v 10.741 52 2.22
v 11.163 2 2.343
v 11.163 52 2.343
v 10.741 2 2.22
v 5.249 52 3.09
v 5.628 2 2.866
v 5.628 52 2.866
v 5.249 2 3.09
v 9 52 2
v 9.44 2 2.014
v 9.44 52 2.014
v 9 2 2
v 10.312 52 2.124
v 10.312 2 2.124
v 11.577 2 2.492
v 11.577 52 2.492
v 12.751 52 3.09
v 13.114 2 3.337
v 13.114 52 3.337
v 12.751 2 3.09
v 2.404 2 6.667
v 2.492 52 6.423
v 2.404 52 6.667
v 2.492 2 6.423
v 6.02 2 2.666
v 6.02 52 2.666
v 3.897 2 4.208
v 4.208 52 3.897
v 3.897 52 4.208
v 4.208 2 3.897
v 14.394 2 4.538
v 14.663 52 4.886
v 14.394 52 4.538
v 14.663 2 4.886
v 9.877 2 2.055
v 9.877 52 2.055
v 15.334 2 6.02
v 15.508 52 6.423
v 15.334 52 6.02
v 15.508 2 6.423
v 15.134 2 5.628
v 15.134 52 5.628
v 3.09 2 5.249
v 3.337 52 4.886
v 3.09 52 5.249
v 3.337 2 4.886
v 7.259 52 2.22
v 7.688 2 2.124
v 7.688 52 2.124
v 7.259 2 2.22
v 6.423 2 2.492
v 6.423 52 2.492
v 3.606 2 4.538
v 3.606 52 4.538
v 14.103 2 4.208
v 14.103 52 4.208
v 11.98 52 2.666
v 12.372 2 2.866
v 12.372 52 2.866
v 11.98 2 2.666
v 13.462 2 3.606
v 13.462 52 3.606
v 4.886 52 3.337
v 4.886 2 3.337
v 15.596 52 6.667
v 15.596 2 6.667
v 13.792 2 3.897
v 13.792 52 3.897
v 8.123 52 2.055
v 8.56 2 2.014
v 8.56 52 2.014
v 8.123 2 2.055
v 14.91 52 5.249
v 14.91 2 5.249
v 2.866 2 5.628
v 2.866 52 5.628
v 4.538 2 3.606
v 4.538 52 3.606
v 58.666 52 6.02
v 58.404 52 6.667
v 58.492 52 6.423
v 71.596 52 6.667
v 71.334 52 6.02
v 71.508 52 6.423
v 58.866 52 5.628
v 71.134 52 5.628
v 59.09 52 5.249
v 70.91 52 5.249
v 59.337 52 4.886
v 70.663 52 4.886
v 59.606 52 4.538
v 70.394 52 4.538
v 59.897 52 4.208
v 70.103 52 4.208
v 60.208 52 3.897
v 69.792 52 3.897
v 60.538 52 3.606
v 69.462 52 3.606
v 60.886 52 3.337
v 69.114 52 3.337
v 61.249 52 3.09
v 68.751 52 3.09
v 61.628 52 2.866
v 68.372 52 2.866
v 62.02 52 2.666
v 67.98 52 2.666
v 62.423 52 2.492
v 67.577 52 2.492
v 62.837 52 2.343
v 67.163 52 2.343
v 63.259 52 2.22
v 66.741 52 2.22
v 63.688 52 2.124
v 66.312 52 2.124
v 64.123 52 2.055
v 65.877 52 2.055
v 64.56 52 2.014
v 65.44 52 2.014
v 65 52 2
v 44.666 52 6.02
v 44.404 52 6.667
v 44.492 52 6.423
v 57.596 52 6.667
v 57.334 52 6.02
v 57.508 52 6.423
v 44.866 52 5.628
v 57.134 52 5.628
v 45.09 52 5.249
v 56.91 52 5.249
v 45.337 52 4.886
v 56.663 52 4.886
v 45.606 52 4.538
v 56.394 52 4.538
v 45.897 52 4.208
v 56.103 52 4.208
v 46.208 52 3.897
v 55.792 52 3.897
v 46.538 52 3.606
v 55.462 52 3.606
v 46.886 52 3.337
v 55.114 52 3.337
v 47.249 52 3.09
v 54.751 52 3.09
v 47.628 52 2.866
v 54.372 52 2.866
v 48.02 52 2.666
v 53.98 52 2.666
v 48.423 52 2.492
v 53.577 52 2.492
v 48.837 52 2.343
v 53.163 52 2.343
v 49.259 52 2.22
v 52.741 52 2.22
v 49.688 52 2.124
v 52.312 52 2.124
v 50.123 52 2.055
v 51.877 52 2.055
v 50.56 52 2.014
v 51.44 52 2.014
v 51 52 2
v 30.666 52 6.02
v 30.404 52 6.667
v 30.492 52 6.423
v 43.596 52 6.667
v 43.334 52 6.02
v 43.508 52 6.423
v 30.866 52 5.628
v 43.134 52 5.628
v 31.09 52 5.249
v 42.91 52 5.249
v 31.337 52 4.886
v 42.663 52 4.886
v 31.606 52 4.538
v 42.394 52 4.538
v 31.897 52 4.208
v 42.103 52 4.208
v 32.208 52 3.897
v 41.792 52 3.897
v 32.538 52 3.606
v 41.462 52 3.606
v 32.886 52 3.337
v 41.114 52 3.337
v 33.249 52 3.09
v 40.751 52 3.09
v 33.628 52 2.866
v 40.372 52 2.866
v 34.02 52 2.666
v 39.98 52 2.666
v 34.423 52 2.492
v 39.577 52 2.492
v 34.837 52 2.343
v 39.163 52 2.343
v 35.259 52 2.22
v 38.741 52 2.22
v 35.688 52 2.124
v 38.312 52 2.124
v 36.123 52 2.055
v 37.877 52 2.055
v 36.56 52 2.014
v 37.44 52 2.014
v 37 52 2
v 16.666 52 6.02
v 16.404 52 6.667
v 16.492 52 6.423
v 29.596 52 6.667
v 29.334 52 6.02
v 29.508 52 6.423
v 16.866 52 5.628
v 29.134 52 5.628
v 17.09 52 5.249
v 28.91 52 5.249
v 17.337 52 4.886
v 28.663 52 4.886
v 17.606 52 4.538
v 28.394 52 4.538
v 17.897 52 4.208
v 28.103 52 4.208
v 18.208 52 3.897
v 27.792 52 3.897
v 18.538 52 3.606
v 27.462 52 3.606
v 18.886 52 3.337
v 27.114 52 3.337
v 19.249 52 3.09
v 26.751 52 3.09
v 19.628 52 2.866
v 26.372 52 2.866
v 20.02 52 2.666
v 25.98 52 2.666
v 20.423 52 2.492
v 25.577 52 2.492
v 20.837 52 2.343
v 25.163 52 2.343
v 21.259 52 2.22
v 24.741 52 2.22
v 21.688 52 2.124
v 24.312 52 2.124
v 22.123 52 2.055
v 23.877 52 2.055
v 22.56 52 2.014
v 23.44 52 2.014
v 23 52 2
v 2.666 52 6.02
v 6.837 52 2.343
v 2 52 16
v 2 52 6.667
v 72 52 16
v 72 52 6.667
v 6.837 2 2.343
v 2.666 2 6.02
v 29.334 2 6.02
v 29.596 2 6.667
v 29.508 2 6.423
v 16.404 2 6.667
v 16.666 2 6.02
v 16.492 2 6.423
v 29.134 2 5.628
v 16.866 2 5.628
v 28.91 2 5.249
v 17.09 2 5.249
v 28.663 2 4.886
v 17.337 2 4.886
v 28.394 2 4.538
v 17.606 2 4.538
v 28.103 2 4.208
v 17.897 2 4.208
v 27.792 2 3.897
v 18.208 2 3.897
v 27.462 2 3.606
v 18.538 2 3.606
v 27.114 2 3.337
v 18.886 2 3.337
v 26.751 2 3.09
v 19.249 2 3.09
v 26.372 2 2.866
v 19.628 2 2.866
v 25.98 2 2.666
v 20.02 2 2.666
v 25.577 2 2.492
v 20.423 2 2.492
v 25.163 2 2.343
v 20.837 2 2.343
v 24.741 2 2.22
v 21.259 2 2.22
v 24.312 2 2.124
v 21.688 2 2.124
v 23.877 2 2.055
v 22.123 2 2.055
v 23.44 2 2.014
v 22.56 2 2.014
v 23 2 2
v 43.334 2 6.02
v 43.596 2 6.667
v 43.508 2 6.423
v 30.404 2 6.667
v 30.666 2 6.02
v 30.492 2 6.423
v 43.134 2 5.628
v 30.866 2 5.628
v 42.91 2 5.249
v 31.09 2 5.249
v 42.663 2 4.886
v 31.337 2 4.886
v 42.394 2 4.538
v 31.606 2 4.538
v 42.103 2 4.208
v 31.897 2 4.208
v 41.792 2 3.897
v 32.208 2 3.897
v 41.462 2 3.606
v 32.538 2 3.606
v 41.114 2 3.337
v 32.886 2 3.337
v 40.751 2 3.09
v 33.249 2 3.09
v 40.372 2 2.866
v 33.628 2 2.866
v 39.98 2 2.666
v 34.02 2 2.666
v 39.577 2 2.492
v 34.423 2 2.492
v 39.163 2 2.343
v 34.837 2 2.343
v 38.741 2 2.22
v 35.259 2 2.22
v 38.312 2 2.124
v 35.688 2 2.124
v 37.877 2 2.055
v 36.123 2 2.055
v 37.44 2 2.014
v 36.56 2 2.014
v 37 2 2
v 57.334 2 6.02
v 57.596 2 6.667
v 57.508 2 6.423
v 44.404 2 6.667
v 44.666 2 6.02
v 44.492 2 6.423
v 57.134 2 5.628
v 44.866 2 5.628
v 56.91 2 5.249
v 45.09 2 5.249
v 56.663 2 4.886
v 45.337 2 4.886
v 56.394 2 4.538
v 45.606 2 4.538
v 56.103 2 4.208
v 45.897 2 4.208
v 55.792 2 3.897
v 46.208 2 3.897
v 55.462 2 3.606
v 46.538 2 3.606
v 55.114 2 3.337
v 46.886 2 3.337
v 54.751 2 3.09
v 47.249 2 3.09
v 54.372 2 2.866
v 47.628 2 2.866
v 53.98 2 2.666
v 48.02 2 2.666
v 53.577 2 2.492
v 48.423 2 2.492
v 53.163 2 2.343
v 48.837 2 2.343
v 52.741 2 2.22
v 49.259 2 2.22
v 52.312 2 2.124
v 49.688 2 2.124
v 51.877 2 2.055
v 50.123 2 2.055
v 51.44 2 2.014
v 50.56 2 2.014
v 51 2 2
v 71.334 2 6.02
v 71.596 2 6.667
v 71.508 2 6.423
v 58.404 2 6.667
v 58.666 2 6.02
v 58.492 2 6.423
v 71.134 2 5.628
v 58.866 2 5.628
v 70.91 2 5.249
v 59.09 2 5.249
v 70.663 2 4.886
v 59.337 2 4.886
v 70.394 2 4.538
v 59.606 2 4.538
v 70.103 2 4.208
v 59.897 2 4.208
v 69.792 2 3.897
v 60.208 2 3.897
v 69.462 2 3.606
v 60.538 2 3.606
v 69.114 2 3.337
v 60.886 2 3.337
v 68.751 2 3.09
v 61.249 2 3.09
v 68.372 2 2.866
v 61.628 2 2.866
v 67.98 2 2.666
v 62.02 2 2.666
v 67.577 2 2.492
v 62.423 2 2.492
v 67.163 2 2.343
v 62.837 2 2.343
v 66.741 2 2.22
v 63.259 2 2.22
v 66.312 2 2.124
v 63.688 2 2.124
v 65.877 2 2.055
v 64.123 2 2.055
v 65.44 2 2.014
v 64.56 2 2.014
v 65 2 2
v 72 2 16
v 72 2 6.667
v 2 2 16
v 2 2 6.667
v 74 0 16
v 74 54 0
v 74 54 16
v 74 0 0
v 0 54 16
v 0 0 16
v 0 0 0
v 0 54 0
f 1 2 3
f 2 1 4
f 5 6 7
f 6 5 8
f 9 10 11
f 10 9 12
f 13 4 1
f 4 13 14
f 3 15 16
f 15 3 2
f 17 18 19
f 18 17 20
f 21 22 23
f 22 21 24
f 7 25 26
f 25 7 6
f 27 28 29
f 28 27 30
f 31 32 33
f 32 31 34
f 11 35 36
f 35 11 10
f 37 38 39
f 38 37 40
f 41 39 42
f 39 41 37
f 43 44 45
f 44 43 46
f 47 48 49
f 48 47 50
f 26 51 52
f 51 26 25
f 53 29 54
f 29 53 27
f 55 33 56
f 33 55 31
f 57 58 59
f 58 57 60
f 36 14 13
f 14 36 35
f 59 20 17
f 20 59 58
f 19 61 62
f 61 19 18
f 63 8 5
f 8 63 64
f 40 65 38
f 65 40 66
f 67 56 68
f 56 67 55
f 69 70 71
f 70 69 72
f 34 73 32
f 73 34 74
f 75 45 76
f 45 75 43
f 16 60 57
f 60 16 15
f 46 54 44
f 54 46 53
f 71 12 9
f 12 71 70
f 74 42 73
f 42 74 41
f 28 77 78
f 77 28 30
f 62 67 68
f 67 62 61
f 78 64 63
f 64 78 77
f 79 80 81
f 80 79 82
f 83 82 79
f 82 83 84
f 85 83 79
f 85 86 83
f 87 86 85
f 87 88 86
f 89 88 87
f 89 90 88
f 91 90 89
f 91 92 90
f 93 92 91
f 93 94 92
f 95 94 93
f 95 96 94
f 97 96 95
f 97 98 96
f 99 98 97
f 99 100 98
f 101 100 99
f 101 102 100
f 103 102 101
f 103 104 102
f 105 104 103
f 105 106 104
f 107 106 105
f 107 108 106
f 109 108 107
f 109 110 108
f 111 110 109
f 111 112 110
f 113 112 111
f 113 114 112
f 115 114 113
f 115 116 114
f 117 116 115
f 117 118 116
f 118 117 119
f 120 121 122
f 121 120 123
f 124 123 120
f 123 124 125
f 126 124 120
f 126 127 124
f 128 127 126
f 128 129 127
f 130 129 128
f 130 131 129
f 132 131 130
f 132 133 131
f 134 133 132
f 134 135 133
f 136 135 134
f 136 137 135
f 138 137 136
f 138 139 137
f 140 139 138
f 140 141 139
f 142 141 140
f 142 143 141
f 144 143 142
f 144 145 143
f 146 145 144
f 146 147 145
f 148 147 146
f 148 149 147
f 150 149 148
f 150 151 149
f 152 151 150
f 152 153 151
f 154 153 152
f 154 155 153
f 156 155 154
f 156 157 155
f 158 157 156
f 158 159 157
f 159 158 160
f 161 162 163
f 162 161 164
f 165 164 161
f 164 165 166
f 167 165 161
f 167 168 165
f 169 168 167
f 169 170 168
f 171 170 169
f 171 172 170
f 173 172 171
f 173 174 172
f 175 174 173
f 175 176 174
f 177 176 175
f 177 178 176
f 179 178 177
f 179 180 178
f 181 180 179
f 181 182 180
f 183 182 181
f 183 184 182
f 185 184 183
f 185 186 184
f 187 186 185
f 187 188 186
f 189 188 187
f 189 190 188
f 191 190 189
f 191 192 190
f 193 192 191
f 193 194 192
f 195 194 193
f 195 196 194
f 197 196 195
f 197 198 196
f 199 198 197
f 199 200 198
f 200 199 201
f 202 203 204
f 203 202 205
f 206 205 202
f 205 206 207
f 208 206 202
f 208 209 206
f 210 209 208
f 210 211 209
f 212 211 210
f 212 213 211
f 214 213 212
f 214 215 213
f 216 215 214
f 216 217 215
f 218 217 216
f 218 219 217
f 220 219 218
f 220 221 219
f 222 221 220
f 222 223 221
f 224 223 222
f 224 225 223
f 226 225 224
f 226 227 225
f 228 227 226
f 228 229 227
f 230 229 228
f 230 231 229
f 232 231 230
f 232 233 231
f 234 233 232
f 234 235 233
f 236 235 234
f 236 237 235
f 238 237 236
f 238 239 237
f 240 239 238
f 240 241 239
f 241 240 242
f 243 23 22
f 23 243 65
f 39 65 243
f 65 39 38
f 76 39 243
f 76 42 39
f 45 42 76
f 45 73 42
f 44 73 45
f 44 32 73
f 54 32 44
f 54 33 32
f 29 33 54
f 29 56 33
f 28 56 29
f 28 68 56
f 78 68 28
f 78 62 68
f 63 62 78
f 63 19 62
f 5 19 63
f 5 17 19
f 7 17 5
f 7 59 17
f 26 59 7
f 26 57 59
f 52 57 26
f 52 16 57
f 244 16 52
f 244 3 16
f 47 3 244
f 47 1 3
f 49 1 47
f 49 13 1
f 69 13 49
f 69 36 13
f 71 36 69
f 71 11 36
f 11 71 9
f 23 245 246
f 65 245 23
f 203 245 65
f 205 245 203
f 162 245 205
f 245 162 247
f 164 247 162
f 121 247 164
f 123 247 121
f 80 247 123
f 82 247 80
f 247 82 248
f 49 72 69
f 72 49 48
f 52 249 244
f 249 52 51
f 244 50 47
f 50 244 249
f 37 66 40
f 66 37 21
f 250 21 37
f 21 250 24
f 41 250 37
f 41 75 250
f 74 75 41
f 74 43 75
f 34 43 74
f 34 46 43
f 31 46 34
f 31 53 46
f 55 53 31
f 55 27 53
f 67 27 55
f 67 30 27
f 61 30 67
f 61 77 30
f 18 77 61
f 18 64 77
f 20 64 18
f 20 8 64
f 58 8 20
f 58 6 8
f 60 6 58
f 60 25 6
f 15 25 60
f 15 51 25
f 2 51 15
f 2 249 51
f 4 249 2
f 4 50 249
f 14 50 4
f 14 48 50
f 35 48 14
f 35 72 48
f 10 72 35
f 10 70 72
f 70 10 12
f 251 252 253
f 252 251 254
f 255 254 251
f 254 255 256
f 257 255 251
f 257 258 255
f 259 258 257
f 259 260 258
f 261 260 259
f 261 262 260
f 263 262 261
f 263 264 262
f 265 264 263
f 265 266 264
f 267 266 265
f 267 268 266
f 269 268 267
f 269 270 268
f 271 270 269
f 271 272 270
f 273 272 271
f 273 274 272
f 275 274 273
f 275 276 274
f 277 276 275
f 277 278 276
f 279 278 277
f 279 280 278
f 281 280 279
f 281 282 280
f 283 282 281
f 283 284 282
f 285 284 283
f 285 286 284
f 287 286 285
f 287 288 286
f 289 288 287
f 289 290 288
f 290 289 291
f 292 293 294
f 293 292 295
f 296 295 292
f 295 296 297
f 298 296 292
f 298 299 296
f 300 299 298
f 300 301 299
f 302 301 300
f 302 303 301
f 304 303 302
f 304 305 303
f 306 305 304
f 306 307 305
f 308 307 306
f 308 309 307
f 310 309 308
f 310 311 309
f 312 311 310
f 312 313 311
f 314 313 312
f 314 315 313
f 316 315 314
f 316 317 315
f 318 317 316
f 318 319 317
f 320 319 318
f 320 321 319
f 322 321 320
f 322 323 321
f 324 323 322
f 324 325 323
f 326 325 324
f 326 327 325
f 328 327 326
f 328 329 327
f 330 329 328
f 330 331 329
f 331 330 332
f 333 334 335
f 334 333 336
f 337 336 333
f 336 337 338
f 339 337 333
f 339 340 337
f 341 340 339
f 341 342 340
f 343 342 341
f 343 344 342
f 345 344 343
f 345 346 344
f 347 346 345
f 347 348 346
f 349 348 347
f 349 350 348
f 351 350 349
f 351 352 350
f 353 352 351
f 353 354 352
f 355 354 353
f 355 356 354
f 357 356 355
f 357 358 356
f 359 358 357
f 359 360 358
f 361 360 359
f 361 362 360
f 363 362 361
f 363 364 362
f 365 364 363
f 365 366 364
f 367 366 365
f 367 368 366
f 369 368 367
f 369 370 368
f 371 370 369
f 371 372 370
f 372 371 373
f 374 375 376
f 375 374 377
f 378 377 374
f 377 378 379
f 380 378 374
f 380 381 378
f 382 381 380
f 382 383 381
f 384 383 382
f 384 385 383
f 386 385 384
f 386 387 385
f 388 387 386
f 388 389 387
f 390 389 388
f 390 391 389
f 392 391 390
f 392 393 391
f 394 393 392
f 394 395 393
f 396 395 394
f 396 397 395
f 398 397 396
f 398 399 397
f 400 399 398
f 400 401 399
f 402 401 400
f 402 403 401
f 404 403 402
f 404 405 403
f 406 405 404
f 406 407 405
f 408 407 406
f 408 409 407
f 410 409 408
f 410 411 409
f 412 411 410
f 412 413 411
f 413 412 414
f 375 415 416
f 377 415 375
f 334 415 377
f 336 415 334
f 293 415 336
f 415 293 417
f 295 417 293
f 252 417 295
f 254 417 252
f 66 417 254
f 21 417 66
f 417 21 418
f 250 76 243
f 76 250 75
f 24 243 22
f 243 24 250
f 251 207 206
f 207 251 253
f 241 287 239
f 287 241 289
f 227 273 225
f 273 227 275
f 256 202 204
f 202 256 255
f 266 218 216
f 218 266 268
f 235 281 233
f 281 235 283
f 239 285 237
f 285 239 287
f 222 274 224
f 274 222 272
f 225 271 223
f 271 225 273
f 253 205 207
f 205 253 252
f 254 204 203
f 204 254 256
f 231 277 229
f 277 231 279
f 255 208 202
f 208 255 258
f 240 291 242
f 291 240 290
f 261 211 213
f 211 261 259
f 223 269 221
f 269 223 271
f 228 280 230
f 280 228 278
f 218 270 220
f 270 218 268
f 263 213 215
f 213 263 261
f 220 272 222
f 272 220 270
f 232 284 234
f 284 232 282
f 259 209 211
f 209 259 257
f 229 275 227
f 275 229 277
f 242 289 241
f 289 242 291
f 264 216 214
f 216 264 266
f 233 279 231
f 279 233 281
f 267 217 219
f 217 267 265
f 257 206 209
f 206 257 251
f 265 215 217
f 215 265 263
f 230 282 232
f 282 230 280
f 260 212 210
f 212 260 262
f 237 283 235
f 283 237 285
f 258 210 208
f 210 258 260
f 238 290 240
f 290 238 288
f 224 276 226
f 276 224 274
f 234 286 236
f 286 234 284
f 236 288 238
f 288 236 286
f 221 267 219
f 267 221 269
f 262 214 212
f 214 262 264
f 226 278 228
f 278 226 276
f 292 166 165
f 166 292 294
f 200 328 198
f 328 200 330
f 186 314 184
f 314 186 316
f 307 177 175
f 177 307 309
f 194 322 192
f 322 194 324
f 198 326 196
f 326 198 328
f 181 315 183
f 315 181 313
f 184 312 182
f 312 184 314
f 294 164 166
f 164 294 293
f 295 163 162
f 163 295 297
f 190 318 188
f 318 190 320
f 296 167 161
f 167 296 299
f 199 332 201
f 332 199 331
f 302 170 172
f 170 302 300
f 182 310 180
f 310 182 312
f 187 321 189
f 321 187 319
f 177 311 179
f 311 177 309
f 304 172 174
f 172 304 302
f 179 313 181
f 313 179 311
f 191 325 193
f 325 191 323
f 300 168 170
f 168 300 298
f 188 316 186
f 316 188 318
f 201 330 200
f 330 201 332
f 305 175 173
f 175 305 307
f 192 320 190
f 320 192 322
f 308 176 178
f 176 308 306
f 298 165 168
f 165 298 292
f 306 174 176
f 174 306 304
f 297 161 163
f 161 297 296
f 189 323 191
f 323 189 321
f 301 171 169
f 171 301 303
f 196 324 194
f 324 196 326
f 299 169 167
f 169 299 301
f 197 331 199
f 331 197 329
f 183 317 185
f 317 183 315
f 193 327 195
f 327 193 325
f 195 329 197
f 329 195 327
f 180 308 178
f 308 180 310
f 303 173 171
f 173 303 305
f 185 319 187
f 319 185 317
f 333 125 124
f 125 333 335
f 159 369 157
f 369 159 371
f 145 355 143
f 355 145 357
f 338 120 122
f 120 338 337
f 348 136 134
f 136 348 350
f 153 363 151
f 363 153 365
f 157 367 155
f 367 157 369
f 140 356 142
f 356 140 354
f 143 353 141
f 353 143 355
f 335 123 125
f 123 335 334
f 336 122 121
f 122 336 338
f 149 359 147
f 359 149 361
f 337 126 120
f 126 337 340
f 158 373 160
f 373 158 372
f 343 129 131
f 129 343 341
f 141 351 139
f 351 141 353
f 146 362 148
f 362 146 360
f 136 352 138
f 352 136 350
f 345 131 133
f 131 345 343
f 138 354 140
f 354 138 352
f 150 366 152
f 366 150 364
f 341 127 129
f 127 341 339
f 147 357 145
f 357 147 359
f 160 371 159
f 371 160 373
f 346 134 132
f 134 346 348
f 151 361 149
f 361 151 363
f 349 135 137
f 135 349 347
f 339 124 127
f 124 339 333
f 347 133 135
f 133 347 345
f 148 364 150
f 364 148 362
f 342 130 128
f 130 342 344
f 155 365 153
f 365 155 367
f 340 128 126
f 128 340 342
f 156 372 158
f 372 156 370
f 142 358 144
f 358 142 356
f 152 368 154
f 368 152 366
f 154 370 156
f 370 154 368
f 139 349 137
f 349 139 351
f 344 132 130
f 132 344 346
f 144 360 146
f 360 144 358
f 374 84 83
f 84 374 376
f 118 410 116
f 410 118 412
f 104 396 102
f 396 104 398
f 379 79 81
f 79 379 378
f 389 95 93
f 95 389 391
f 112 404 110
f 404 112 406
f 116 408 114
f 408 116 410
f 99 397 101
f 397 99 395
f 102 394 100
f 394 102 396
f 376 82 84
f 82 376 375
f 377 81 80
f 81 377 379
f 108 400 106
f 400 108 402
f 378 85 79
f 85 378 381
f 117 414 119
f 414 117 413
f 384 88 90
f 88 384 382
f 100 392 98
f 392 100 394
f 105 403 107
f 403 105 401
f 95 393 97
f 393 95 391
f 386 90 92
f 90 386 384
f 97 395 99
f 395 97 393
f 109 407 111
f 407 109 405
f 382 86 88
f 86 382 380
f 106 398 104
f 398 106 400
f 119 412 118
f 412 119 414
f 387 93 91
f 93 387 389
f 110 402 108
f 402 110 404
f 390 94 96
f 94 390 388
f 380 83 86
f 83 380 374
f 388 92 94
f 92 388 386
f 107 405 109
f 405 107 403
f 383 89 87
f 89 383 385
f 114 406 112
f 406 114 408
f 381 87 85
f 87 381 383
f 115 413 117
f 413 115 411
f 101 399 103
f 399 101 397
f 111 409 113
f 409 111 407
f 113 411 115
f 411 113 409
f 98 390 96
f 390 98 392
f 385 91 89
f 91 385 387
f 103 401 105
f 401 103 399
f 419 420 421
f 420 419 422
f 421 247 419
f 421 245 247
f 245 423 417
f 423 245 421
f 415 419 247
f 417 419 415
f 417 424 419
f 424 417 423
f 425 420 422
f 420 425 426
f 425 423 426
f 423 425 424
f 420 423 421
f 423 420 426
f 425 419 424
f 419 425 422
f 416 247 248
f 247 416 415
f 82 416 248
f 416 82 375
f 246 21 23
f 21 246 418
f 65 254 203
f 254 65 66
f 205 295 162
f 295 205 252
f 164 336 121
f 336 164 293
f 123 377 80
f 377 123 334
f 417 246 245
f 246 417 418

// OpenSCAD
thickness = 2;
batteries = 5;
brackets = true; // [true, false]

type = "AA"; // [AA,AAA,AAAA,C,D,custom]

custom_diameter = 14; //mm
custom_length = 50; //mm

if (type == "custom") batteryTray(custom_diameter, custom_length);
else if (type == "AA") batteryTray(14,50);
else if (type == "AAA") batteryTray(10,44);
else if (type == "AAAA") batteryTray(8.3,42.5);
else if (type == "C") batteryTray(26,50);
else if (type == "D") batteryTray(34,61);
else batteryTray(14,50);

module batteryTray (diameter, length) {
	difference() {
	cube([diameter*batteries+2*thickness,length+2*thickness,diameter+thickness]);
		translate([thickness,thickness,thickness+diameter/3])
		cube([diameter*batteries,length,diameter*2]);
		if (brackets) {
			rotate ([90,0,0])
			translate([diameter/2+thickness,diameter/2+thickness,-length-thickness])
			for ( i = [0 : batteries-1] ) {
				translate([diameter*i,0,0])
				cylinder (h = length, r=diameter/2, center = false, $fn=100);
			}
		}
	}
}
